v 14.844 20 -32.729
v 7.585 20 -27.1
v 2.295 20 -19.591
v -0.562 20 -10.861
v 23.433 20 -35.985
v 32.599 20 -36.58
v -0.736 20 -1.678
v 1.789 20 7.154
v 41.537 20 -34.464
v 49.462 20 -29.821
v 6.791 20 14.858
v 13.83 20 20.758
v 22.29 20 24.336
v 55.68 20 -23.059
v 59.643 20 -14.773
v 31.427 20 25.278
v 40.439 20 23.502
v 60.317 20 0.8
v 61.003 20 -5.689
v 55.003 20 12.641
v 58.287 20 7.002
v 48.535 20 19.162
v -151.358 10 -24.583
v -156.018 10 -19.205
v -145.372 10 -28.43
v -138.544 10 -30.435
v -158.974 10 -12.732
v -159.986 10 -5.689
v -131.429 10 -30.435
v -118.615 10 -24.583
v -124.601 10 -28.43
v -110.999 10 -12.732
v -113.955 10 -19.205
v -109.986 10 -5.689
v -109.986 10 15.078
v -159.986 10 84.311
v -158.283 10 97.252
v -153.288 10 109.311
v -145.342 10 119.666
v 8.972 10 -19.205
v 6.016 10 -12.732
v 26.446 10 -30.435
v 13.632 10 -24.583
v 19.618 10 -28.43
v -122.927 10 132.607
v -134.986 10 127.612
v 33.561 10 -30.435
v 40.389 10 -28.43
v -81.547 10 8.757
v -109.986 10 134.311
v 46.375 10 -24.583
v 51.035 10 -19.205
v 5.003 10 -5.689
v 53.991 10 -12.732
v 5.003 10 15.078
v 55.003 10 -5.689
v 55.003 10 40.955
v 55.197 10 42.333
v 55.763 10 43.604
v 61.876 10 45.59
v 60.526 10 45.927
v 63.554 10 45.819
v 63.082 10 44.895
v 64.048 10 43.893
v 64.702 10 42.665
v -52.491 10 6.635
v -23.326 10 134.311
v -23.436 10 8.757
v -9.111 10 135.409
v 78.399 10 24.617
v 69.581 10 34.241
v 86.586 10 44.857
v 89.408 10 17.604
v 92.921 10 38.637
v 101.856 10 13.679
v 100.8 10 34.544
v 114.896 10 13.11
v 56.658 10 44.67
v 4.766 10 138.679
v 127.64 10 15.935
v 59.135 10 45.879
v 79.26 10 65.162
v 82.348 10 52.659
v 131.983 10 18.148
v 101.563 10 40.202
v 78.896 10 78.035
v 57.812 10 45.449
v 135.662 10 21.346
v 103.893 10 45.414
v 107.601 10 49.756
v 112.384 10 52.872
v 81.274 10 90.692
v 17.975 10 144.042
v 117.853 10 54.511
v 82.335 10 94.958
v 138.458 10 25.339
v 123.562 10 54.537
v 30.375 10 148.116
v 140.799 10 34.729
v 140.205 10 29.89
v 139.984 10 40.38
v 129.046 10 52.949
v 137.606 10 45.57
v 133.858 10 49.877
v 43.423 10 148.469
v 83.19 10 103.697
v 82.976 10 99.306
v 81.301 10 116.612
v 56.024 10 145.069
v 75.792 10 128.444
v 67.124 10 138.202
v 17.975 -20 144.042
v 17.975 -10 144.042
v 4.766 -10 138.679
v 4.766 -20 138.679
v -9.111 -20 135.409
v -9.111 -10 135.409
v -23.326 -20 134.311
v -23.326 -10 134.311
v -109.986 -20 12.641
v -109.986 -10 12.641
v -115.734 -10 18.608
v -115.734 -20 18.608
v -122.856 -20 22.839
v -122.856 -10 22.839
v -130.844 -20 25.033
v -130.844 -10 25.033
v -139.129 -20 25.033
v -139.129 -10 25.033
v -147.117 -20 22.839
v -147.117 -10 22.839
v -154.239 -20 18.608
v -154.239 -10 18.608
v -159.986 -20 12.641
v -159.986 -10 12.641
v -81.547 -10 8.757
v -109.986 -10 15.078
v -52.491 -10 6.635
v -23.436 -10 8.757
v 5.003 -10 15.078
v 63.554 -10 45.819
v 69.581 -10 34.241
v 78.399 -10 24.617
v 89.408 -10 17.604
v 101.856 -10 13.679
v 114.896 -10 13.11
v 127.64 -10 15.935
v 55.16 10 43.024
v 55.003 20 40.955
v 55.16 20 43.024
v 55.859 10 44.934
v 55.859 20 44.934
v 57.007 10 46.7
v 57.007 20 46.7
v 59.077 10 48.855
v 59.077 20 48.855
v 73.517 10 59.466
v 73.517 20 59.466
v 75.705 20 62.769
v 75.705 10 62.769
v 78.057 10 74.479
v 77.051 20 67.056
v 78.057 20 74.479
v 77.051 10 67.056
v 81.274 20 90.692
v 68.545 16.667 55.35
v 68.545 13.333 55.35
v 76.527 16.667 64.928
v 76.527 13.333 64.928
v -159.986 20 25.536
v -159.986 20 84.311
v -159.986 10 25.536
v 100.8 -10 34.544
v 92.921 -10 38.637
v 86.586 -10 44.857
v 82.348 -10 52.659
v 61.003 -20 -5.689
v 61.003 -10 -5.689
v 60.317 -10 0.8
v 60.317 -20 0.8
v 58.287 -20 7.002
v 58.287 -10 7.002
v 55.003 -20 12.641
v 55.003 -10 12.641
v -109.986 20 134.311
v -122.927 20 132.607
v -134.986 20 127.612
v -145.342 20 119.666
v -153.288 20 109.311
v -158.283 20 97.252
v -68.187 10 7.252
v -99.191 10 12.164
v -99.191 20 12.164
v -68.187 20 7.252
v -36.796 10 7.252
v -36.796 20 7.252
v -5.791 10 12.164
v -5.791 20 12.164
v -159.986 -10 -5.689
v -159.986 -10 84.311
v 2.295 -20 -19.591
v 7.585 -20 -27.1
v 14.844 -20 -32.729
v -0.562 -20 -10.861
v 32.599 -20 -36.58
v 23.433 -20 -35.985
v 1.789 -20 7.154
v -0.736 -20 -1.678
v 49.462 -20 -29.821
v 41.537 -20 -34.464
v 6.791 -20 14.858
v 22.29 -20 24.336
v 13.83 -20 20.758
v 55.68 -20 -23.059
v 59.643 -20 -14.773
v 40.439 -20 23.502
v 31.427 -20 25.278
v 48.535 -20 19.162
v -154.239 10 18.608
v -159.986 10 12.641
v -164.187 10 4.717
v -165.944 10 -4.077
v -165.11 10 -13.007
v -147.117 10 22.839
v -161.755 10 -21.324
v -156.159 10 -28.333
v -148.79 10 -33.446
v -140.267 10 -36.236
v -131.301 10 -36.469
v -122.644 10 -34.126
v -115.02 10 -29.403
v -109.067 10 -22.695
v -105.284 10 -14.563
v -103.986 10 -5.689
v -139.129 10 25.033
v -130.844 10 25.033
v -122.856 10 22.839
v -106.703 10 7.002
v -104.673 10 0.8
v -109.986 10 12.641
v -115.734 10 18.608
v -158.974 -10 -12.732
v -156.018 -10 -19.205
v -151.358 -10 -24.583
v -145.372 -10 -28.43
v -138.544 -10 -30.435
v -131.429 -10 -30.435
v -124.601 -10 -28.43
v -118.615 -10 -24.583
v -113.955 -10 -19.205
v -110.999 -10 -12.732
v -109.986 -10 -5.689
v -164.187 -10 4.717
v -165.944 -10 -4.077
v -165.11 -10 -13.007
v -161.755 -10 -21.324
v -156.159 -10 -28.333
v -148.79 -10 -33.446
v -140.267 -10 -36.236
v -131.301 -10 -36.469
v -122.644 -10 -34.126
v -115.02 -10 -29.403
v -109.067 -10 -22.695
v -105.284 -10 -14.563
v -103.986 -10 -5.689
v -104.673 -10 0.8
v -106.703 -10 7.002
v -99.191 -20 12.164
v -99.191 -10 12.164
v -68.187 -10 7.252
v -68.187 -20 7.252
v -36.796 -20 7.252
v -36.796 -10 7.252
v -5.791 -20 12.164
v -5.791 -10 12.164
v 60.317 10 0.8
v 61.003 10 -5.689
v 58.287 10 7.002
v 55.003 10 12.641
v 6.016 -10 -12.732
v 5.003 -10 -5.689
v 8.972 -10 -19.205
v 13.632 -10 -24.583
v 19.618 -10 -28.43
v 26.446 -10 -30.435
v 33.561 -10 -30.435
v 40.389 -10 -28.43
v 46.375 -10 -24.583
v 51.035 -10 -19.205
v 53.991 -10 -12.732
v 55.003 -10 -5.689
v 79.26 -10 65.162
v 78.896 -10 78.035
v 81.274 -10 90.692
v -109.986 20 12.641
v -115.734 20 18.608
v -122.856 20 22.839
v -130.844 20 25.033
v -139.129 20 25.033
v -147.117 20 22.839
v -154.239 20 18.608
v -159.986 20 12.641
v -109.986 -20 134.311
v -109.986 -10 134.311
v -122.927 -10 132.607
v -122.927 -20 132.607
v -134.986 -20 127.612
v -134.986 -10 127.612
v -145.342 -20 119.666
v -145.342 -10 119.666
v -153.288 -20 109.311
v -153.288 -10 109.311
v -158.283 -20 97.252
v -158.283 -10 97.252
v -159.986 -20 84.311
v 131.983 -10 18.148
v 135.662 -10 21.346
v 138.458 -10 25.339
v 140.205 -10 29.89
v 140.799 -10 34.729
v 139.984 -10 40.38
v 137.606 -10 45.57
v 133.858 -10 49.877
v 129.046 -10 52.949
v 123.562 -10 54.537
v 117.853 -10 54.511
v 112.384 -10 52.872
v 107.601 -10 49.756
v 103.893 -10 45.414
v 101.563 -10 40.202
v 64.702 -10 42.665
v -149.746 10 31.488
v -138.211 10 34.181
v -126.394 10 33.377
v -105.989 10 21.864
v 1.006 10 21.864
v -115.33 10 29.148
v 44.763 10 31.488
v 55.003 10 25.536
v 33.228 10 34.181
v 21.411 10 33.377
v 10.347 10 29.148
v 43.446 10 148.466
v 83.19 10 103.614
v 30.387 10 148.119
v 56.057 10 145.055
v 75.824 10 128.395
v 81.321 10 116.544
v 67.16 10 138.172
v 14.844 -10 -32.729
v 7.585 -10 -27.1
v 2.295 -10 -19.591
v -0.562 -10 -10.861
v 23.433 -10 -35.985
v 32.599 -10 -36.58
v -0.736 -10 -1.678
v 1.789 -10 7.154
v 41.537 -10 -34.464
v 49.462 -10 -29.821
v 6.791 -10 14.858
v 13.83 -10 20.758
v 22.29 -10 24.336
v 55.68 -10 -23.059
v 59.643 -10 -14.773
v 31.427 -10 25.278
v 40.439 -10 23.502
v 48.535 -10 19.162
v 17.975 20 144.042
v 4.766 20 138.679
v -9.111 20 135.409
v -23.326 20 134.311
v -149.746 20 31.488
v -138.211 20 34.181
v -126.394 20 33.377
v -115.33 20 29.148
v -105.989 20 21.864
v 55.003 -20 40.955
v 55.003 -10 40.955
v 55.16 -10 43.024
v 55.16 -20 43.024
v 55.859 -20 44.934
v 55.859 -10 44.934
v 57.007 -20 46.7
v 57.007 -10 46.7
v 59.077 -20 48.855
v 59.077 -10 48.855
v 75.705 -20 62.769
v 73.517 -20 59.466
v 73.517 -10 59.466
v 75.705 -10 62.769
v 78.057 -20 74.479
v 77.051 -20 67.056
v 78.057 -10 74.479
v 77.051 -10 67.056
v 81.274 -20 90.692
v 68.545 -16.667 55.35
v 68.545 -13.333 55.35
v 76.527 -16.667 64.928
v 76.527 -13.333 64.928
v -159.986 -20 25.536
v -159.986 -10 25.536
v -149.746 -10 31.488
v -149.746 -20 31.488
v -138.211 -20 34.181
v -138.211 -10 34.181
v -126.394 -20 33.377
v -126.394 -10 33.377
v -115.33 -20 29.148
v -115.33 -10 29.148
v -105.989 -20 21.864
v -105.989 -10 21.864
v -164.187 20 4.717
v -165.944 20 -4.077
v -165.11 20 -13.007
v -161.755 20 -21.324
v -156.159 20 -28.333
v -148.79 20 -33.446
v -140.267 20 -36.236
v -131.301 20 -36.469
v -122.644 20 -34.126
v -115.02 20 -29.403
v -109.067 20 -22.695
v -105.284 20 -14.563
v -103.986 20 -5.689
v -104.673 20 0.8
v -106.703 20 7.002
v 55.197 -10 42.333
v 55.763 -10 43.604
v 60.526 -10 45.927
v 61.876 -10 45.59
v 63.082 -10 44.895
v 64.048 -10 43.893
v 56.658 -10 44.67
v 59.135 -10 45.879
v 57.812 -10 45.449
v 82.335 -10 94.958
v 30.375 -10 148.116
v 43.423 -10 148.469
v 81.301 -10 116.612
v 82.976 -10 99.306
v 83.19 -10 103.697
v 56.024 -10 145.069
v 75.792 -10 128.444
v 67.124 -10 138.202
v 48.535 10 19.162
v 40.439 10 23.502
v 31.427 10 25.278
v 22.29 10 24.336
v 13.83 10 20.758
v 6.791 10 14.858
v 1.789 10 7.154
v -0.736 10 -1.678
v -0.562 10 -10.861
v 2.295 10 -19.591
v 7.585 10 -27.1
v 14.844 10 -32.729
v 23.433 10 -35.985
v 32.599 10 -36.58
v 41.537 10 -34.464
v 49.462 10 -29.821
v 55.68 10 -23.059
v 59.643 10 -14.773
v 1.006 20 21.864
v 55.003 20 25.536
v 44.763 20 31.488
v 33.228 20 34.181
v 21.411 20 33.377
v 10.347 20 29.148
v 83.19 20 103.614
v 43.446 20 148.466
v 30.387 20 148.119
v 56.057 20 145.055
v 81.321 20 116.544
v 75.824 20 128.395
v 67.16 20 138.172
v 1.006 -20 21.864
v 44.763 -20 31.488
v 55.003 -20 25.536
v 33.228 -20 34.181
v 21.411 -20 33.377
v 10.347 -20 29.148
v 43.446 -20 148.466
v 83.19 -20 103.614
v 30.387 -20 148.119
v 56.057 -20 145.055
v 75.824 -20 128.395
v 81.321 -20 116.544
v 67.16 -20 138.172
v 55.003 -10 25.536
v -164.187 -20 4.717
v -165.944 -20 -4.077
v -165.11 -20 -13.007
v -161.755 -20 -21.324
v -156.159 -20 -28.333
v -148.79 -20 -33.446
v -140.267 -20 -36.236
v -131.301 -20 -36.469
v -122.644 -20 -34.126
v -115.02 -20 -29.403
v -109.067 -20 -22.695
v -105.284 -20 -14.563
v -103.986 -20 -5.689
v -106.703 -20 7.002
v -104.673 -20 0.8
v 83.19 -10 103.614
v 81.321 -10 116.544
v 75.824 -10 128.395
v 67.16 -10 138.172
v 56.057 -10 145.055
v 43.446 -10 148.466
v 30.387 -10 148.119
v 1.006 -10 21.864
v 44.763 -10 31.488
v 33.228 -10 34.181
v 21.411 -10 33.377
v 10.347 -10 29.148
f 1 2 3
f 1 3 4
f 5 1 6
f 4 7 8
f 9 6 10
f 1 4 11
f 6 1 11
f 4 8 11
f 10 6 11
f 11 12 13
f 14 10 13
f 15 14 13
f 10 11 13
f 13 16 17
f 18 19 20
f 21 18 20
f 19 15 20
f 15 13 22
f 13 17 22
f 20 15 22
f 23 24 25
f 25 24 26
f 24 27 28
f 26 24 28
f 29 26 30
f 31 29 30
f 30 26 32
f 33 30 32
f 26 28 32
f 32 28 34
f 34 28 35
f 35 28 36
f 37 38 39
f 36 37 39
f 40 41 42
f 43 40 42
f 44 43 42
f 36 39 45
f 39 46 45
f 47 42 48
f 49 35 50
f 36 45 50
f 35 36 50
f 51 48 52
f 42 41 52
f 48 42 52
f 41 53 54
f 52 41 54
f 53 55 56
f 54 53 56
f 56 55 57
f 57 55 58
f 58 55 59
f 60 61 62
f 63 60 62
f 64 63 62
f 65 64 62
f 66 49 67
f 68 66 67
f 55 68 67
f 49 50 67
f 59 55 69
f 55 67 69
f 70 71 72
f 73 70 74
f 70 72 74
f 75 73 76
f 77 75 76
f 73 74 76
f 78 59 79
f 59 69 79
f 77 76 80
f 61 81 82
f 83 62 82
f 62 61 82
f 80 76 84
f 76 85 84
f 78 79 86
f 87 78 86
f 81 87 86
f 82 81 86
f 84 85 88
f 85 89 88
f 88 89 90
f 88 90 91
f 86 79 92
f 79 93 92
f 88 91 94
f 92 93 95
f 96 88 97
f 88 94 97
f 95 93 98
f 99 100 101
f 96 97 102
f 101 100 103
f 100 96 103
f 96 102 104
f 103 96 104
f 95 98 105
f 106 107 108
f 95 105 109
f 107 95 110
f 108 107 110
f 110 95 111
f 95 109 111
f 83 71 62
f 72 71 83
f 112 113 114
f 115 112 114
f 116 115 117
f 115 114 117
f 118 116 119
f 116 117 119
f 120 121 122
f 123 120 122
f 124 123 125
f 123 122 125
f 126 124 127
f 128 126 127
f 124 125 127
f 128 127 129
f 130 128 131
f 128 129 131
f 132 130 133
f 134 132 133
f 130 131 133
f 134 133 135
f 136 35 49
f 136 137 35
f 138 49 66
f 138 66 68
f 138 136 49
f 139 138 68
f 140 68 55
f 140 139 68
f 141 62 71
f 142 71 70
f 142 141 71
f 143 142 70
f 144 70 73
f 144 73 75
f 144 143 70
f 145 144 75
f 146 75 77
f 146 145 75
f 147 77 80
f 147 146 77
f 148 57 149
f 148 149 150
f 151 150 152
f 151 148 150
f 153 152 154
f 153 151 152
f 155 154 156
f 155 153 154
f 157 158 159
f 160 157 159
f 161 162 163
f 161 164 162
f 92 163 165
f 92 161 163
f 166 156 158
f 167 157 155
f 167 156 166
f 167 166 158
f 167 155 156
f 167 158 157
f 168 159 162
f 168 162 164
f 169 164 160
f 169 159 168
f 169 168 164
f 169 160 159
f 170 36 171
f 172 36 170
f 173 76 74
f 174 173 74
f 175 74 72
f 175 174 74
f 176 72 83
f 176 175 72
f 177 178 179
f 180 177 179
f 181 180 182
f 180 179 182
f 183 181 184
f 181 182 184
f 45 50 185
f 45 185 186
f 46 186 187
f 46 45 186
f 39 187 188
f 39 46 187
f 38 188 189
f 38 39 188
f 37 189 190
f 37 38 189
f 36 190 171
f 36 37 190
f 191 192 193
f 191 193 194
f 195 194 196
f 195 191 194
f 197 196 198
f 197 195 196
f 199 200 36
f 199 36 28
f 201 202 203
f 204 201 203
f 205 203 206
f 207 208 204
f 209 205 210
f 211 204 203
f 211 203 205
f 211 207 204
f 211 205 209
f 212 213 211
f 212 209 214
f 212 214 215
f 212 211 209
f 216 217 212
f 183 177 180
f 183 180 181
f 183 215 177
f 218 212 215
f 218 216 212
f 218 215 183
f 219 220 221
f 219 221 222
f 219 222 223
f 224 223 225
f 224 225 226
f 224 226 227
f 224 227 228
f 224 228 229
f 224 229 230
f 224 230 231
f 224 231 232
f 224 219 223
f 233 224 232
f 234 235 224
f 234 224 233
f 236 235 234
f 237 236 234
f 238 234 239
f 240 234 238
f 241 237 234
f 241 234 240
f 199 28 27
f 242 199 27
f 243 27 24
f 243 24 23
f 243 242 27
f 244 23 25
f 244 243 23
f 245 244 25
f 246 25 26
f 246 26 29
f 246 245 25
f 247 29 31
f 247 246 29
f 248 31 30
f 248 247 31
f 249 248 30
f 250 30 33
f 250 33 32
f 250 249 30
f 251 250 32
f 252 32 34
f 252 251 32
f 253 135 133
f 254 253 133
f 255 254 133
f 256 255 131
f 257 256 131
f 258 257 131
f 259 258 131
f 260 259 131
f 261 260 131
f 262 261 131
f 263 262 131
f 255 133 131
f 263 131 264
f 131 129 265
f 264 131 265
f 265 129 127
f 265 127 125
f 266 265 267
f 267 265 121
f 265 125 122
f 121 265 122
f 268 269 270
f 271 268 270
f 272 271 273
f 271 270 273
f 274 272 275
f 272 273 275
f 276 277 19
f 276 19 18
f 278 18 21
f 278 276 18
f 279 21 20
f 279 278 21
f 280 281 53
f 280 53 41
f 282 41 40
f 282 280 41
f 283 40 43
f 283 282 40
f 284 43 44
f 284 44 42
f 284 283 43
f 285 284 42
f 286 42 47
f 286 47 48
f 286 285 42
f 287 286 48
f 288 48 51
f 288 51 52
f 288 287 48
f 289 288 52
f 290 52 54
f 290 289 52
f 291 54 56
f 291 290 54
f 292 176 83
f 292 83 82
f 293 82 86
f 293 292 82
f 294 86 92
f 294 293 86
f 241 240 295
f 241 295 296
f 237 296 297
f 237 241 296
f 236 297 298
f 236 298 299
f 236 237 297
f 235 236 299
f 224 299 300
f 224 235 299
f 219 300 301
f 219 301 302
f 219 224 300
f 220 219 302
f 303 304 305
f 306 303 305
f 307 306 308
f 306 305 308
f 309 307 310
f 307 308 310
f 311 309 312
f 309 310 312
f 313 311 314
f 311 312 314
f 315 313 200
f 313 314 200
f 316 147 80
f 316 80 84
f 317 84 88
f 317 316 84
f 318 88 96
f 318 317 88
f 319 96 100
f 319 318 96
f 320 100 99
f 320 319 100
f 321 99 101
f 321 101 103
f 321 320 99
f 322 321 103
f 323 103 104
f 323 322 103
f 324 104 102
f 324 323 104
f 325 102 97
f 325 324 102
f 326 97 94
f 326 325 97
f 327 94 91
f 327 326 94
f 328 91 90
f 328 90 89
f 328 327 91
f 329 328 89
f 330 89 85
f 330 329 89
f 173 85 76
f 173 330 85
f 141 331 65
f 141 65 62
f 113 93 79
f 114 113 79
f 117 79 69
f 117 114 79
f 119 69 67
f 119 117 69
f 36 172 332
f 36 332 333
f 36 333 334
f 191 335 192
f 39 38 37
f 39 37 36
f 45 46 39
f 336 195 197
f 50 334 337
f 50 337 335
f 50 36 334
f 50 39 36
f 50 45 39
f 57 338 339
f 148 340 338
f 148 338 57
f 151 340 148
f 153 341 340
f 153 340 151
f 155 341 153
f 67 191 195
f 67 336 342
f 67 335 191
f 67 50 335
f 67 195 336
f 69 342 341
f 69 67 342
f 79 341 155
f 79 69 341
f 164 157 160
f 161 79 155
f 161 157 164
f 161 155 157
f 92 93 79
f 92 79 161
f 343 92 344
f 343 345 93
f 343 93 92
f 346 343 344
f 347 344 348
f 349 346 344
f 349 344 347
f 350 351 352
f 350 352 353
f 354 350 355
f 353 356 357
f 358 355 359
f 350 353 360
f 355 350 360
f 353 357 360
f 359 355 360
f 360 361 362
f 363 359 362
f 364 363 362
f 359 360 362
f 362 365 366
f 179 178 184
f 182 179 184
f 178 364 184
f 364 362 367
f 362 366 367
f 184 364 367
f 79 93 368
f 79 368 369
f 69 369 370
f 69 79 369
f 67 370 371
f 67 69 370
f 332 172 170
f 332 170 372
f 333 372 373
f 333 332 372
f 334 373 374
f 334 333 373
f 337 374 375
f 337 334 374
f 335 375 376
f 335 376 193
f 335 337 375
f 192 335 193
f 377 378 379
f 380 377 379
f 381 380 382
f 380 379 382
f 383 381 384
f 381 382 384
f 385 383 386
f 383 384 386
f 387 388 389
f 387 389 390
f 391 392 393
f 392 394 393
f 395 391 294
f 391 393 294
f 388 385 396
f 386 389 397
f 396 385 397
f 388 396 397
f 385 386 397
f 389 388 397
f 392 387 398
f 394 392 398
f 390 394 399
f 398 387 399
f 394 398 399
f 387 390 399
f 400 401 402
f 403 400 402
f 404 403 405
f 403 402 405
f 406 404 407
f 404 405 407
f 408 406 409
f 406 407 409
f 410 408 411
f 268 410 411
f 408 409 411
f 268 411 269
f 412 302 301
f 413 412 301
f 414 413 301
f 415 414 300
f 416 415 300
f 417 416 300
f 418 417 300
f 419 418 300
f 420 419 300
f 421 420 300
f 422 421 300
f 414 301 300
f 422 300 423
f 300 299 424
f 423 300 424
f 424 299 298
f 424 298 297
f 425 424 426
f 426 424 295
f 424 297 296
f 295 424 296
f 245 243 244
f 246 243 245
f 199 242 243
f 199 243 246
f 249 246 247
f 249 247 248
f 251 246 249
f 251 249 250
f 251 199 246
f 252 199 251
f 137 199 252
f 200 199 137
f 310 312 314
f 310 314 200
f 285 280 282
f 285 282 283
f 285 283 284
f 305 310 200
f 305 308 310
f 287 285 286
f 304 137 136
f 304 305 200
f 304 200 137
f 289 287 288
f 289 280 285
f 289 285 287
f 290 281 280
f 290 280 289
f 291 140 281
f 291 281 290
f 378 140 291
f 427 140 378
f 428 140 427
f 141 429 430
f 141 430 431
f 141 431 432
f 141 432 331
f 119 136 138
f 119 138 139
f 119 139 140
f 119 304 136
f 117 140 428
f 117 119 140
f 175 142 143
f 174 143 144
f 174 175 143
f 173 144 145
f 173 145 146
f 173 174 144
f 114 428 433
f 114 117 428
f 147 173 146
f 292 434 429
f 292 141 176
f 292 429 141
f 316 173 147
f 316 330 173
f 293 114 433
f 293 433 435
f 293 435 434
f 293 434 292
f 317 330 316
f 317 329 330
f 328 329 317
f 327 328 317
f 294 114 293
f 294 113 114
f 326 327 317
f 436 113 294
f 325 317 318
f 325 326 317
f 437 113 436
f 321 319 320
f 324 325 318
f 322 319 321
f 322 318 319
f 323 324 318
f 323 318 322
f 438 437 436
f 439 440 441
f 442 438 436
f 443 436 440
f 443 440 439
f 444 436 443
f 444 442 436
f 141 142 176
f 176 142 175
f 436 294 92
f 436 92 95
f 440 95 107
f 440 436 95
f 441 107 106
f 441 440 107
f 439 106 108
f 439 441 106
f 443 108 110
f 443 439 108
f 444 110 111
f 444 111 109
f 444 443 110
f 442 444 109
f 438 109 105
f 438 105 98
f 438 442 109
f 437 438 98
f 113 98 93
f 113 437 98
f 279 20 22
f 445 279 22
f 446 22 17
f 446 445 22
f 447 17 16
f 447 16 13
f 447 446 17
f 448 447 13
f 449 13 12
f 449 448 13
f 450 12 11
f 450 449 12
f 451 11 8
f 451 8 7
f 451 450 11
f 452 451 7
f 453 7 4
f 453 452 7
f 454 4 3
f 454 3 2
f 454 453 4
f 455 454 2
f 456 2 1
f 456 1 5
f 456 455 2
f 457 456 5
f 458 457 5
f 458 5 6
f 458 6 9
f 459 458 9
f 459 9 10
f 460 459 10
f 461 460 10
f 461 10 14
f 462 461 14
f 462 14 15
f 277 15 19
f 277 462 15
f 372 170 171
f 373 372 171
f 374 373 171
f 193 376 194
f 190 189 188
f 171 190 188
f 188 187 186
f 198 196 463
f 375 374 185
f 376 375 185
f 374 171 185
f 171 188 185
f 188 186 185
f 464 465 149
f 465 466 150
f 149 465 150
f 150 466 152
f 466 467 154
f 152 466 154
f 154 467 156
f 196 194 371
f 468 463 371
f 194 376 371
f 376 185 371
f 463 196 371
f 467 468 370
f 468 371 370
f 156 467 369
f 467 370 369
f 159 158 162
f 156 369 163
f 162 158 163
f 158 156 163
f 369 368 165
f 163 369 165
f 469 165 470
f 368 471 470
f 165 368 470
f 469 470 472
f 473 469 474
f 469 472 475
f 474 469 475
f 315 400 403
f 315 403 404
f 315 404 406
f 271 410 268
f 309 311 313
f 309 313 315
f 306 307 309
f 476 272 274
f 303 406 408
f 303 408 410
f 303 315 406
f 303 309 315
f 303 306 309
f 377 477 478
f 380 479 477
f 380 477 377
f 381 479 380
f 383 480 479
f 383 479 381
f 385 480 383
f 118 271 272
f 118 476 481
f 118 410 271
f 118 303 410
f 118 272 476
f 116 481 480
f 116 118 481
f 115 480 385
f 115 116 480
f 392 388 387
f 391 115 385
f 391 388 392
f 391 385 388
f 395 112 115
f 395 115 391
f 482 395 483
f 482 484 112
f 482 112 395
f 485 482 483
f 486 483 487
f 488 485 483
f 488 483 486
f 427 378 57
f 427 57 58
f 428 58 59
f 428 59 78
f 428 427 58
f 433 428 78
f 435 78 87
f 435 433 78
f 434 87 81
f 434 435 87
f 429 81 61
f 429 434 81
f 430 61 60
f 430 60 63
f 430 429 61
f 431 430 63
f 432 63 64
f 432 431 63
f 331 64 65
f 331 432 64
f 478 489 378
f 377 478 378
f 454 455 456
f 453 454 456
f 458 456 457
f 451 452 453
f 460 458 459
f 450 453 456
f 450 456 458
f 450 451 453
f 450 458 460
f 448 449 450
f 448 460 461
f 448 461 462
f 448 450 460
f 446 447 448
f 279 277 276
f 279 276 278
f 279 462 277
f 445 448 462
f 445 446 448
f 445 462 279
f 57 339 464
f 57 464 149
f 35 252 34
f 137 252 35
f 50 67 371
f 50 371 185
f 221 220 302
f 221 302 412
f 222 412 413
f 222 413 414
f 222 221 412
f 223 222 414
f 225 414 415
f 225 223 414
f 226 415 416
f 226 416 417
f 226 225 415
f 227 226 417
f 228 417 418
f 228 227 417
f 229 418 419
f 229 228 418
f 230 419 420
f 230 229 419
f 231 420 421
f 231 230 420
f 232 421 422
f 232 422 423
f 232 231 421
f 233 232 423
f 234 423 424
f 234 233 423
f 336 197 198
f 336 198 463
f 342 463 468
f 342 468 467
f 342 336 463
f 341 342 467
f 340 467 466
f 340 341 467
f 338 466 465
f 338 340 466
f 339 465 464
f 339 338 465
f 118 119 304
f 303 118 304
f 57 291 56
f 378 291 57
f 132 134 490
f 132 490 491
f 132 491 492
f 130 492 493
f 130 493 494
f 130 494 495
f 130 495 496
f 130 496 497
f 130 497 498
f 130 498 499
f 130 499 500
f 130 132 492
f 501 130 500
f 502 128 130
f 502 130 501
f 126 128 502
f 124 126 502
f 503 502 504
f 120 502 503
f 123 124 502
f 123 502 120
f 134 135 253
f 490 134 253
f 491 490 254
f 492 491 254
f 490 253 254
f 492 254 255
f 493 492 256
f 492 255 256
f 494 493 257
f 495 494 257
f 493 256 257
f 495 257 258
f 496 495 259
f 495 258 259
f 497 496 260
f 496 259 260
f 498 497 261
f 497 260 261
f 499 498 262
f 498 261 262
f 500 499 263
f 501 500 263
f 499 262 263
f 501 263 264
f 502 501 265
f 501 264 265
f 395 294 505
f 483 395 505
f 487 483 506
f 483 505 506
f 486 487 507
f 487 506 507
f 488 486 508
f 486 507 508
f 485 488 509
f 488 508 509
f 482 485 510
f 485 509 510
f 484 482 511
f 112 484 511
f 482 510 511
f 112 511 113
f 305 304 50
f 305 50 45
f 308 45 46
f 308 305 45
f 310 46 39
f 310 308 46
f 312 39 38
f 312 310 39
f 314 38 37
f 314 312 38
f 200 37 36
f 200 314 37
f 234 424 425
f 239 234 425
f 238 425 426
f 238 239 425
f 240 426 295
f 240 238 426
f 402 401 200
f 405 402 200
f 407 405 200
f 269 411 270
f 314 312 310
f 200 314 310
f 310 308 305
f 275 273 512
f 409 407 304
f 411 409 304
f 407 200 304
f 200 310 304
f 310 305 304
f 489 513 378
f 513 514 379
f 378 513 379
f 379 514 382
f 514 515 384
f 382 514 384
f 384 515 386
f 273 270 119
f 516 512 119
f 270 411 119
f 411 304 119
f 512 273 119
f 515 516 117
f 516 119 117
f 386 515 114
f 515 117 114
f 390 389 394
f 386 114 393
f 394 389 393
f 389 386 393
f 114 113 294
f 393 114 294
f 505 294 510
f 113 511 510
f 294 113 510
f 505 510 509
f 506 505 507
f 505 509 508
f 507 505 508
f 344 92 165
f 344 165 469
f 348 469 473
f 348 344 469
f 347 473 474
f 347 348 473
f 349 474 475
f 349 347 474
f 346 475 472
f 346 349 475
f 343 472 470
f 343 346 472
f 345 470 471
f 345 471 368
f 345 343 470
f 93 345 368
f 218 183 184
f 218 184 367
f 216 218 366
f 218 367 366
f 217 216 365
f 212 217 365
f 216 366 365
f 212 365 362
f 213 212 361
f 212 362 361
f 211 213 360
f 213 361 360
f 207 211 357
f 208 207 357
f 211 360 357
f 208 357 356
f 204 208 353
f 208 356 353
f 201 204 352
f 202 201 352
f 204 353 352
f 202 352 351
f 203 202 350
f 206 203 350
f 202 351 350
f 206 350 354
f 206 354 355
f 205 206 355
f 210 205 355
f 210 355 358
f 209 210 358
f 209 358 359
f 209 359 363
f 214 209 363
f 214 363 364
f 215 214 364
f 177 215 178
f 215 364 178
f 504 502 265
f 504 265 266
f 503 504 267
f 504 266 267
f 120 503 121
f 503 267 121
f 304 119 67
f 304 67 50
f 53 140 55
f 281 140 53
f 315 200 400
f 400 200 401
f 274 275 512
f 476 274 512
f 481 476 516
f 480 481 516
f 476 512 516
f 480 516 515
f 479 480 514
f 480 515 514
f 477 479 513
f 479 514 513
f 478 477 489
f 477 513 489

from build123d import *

# Parameters (mm, degrees)
F1_DEPTH = 10
F3_DEPTH = 10
F6_DEPTH = 10


with BuildPart() as f1:
    # F0 (on Front) → F1 (new body, symmetric)
    with BuildSketch(Plane.XZ):
        with BuildLine():
            ThreePointArc((-109.9863715538, 15.0775118893), (-52.4914807127, 6.6351729921), (5.0034101283, 15.0775118893))
            ThreePointArc((5.0034101283, 15.0775118893), (30.0034101283, 26.810952232), (55.0034101283, 15.0775118893))
            Line((55.0034101283, 15.0775118893), (55.0034101283, 40.9545431339))
            ThreePointArc((55.0034101283, 40.9545431339), (59.13516924, 45.878581899), (64.7018732323, 42.6646438505))
            Line((64.7018732323, 42.6646438505), (63.5539137115, 45.8186367123))
            ThreePointArc((63.5539137115, 45.8186367123), (89.4076316637, 17.6042545268), (127.6395519171, 15.9350128393))
            ThreePointArc((127.6395519171, 15.9350128393), (109.403341247, 18.293063951), (100.800000778, 34.5442890563))
            ThreePointArc((100.800000778, 34.5442890563), (89.5220173312, 41.5115712138), (82.3477661272, 52.6590395789))
            Line((82.3477661272, 52.6590395789), (73.7972625441, 76.1513550985))
            ThreePointArc((73.7972625441, 76.1513550985), (8.9945822777, 69.2658261804), (5.0034101283, 134.310952232))
            Line((5.0034101283, 134.310952232), (-23.3257505188, 134.310952232))
            Line((-23.3257505188, 134.310952232), (-109.9863715538, 134.310952232))
            ThreePointArc((-109.9863715538, 134.310952232), (-145.3417106131, 119.6662912913), (-159.9863715538, 84.310952232))
            Line((-159.9863715538, 84.310952232), (-159.9863715538, 15.0775118893))
            ThreePointArc((-159.9863715538, 15.0775118893), (-134.9863715538, 26.810952232), (-109.9863715538, 15.0775118893))
        make_face()
        with BuildLine():
            Line((-109.9863715538, -5.689047768), (-109.9863715538, 15.0775118893))
            ThreePointArc((-109.9863715538, 15.0775118893), (-134.9863715538, 26.810952232), (-159.9863715538, 15.0775118893))
            Line((-159.9863715538, 15.0775118893), (-159.9863715538, -5.689047768))
            ThreePointArc((-159.9863715538, -5.689047768), (-134.9863715538, 19.310952232), (-109.9863715538, -5.689047768))
        make_face()
        with BuildLine():
            ThreePointArc((-159.9863715538, -5.689047768), (-134.9863715538, -30.689047768), (-109.9863715538, -5.689047768))
            ThreePointArc((-109.9863715538, -5.689047768), (-134.9863715538, 19.310952232), (-159.9863715538, -5.689047768))
        make_face()
        with BuildLine():
            ThreePointArc((55.0034101283, -5.689047768), (30.0034101283, 19.310952232), (5.0034101283, -5.689047768))
            ThreePointArc((5.0034101283, -5.689047768), (30.0034101283, -30.689047768), (55.0034101283, -5.689047768))
        make_face()
        with BuildLine():
            ThreePointArc((55.0034101283, 15.0775118893), (30.0034101283, 26.810952232), (5.0034101283, 15.0775118893))
            Line((5.0034101283, 15.0775118893), (5.0034101283, -5.689047768))
            ThreePointArc((5.0034101283, -5.689047768), (30.0034101283, 19.310952232), (55.0034101283, -5.689047768))
            Line((55.0034101283, -5.689047768), (55.0034101283, 15.0775118893))
        make_face()
        with BuildLine():
            ThreePointArc((17.9754860674, 144.0415997005), (11.0483837227, 139.7642656748), (5.0034101283, 134.310952232))
            ThreePointArc((5.0034101283, 134.310952232), (8.9945822777, 69.2658261804), (73.7972625441, 76.1513550985))
            ThreePointArc((73.7972625441, 76.1513550985), (78.2001265033, 83.0798890213), (81.2737442599, 90.6918971171))
            ThreePointArc((81.2737442599, 90.6918971171), (82.7084308484, 97.124207571), (83.1900900666, 103.6969503608))
            ThreePointArc((83.1900900666, 103.6969503608), (61.8237581558, 142.0396005858), (17.9754860674, 144.0415997005))
        make_face()
        with BuildLine():
            Line((73.7972625441, 76.1513550985), (82.3477661272, 52.6590395789))
            ThreePointArc((82.3477661272, 52.6590395789), (78.7337568866, 71.5885760217), (81.2737442599, 90.6918971171))
            ThreePointArc((81.2737442599, 90.6918971171), (78.2001265033, 83.0798890213), (73.7972625441, 76.1513550985))
        make_face()
        with BuildLine():
            ThreePointArc((17.9754860674, 144.0415997005), (-2.1097327274, 136.7764666502), (-23.3257505188, 134.310952232))
            Line((-23.3257505188, 134.310952232), (5.0034101283, 134.310952232))
            ThreePointArc((5.0034101283, 134.310952232), (11.0483837227, 139.7642656748), (17.9754860674, 144.0415997005))
        make_face()
        with BuildLine():
            ThreePointArc((100.800000778, 34.5442890563), (109.403341247, 18.293063951), (127.6395519171, 15.9350128393))
            ThreePointArc((127.6395519171, 15.9350128393), (137.1821899363, 23.257336528), (140.7991490506, 34.728865255))
            ThreePointArc((140.7991490506, 34.728865255), (120.7068599686, 54.728652322), (100.800000778, 34.5442890563))
        make_face()
    extrude(amount=F1_DEPTH, both=True)


with BuildPart() as f3:
    # F2 (on face) → F3 (new body)
    with BuildSketch(Plane.XZ.offset(10)):
        with BuildLine():
            ThreePointArc((-159.9863715538, 12.6412550118), (-144.6300223147, -35.1508874933), (-103.9863715538, -5.689047768))
            ThreePointArc((-103.9863715538, -5.689047768), (-105.5245318284, 3.954602993), (-109.9863715537, 12.6412550118))
            Line((-109.9863715538, 12.6412550118), (-109.9863715538, -5.689047768))
            ThreePointArc((-109.9863715538, -5.689047768), (-134.9863715538, -30.689047768), (-159.9863715538, -5.689047768))
            Line((-159.9863715538, -5.689047768), (-159.9863715538, 12.6412550118))
        make_face()
        with BuildLine():
            Line((-109.9863715538, -5.689047768), (-109.9863715538, 12.6412550118))
            ThreePointArc((-109.9863715537, 12.6412550118), (-134.9863715537, 25.310952232), (-159.9863715538, 12.6412550118))
            Line((-159.9863715538, 12.6412550118), (-159.9863715538, -5.689047768))
            ThreePointArc((-159.9863715538, -5.689047768), (-134.9863715538, -30.689047768), (-109.9863715538, -5.689047768))
        make_face()
    extrude(amount=F3_DEPTH)


with BuildPart() as f3b:
    # F2 (on face) → F3, piece 2 (new body)
    with BuildSketch(Plane.XZ.offset(10)):
        with BuildLine():
            Line((5.0034101283, -5.689047768), (5.0034101283, 12.6412550118))
            ThreePointArc((5.0034101283, 12.6412550118), (20.3597593673, -35.1508874933), (61.0034101283, -5.689047768))
            ThreePointArc((61.0034101283, -5.689047768), (59.4652498537, 3.954602993), (55.0034101283, 12.6412550118))
            Line((55.0034101283, 12.6412550118), (55.0034101283, -5.689047768))
            ThreePointArc((55.0034101283, -5.689047768), (30.0034101283, -30.689047768), (5.0034101283, -5.689047768))
        make_face()
        with BuildLine():
            ThreePointArc((55.0034101283, 12.6412550118), (30.0034101283, 25.310952232), (5.0034101283, 12.6412550118))
            Line((5.0034101283, 12.6412550118), (5.0034101283, -5.689047768))
            ThreePointArc((5.0034101283, -5.689047768), (30.0034101283, -30.689047768), (55.0034101283, -5.689047768))
            Line((55.0034101283, -5.689047768), (55.0034101283, 12.6412550118))
        make_face()
    extrude(amount=F3_DEPTH)


with BuildPart() as f4_1:
    # F4: instance of F3
    add(f3.part.mirror(Plane.XZ))


with BuildPart() as f4_2:
    # F4: instance of F3b
    add(f3b.part.mirror(Plane.XZ))


with BuildPart() as f6:
    # F5 (on face) → F6 (new body)
    with BuildSketch(Plane.XZ.offset(10)):
        with BuildLine():
            ThreePointArc((81.2737442599, 90.6918971171), (67.1599365833, 138.1720247077), (17.9754860674, 144.0415997005))
            ThreePointArc((17.9754860674, 144.0415997005), (-2.1097327274, 136.7764666502), (-23.3257505188, 134.310952232))
            Line((-23.3257505188, 134.310952232), (-109.9863715538, 134.310952232))
            ThreePointArc((-109.9863715538, 134.310952232), (-145.3417106131, 119.6662912913), (-159.9863715538, 84.310952232))
            Line((-159.9863715538, 84.310952232), (-159.9863715538, 25.535942224))
            ThreePointArc((-159.9863715538, 25.535942224), (-126.3935833562, 33.3771011463), (-99.1914622222, 12.1638081925))
            ThreePointArc((-99.1914622222, 12.1638081925), (-52.4914807127, 6.6351729921), (-5.7914992032, 12.1638081925))
            ThreePointArc((-5.7914992032, 12.1638081925), (21.4106219308, 33.3771011463), (55.0034101283, 25.535942224))
            Line((55.0034101283, 25.535942224), (55.0034101283, 40.9545431339))
            add(Edge.make_bspline(
                [(55.0034101283, 40.9545431339), (54.5579449086, 47.5712268811), (69.8601535603, 55.014111341), (78.7572387814, 64.4975553299), (77.7230419168, 80.2440019801), (81.2737442599, 90.6918971171)],
                knots=[0, 0, 0, 0, 0.3394904316, 0.6091406625, 1, 1, 1, 1], degree=3))
        make_face()
    extrude(amount=F6_DEPTH)


with BuildPart() as f7_1:
    # F7: instance of F6
    add(f6.part.mirror(Plane.XZ))


solid = Compound([f1.part, f3.part, f3b.part, f4_1.part, f4_2.part, f6.part, f7_1.part])
